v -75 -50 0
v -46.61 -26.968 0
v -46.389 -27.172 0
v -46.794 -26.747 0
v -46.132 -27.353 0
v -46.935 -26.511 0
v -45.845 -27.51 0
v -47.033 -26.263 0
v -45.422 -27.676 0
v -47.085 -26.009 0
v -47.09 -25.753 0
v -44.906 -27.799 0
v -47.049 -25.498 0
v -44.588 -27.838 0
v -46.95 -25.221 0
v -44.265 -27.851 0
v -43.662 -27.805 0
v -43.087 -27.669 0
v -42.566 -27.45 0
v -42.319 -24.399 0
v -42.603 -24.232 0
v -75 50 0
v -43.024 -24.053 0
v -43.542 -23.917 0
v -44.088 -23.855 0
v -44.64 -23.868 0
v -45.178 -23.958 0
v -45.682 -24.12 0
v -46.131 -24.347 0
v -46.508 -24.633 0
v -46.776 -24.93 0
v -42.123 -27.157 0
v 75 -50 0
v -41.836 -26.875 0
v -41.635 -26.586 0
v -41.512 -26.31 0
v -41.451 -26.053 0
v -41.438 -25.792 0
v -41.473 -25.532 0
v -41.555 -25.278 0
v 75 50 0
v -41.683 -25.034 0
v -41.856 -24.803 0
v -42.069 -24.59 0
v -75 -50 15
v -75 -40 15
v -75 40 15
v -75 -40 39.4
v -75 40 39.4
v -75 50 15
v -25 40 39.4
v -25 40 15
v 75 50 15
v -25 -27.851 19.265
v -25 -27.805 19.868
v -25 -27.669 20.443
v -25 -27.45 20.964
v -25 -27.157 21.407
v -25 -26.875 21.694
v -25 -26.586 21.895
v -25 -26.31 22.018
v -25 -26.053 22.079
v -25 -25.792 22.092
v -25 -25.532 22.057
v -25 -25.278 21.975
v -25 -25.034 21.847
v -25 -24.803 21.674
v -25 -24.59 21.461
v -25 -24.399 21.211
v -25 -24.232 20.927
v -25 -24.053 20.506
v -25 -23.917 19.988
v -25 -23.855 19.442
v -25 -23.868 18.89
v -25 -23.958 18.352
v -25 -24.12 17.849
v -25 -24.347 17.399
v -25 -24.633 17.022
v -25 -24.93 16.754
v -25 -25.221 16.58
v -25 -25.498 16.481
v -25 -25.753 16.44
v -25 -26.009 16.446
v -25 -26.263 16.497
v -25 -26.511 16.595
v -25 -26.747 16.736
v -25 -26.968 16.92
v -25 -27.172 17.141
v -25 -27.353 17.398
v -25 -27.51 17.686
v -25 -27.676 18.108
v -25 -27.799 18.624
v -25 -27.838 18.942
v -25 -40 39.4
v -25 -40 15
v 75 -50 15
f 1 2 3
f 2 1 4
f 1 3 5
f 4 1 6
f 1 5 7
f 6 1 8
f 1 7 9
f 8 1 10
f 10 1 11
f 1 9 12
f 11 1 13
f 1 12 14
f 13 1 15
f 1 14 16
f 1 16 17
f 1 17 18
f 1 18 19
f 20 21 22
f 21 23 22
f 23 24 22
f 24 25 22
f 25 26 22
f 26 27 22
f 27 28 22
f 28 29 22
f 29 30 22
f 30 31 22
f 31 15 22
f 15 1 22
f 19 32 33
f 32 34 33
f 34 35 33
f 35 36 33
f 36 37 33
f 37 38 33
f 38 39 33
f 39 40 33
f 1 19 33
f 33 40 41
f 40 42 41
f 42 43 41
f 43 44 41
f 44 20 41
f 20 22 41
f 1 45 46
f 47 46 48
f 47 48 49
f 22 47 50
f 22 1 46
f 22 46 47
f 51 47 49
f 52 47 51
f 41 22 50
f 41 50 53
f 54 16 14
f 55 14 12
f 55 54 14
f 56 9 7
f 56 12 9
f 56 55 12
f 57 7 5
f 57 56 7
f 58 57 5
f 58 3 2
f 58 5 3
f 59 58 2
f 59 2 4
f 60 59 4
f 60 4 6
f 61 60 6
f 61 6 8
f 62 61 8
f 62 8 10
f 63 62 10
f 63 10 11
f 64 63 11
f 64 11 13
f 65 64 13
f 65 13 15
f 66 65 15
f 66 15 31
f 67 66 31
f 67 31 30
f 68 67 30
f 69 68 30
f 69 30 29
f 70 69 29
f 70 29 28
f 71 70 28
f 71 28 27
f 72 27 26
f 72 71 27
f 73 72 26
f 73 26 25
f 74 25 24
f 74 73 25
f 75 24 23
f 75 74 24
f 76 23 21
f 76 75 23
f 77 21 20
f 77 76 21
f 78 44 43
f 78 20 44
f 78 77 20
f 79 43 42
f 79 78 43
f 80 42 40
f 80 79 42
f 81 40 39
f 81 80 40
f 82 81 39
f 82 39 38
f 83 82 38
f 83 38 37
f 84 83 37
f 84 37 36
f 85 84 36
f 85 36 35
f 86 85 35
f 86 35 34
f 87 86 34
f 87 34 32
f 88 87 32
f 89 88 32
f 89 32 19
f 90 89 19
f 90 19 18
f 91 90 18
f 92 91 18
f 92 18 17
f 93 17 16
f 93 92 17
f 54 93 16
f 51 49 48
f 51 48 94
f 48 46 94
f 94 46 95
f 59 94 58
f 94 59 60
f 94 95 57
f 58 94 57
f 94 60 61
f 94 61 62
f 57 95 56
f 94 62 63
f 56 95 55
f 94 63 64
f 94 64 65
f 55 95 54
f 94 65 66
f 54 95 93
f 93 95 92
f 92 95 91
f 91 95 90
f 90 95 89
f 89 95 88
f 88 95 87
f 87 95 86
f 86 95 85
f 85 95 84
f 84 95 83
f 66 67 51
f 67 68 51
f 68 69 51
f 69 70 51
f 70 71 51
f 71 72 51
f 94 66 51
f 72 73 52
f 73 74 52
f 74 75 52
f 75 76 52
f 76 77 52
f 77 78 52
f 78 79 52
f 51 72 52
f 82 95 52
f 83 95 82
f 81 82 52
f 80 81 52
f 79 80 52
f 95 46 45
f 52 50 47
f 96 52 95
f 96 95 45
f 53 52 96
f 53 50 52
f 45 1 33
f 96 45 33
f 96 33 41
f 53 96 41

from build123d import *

# Parameters (mm, degrees)
F0_W     = 150
F0_H     = 100
F1_DEPTH = 15
F2_W     = 50
F2_H     = 80
F3_DEPTH = 24.4
F5_R     = 2
F6_DEPTH = 64.2


with BuildPart() as f1:
    # F0 (on Top) → F1 (new body)
    with BuildSketch(Plane.XY):
        Rectangle(F0_W, F0_H)
    extrude(amount=F1_DEPTH)

    # F2 (on face) → F3 (join)
    with BuildSketch(Plane.XY.offset(15)):
        with Locations((-50, 0)):
            Rectangle(F2_W, F2_H)
    extrude(amount=F3_DEPTH)

    # F5 (on face) → F6 (cut)
    with BuildSketch(Plane(origin=(7.2, 0, 7.2), x_dir=(0, -1, 0), z_dir=(-0.707107, 0, -0.707107))):
        with Locations((25.850689, 31.300105)):
            Circle(F5_R)
    extrude(amount=F6_DEPTH, mode=Mode.SUBTRACT)


solid = f1.part
